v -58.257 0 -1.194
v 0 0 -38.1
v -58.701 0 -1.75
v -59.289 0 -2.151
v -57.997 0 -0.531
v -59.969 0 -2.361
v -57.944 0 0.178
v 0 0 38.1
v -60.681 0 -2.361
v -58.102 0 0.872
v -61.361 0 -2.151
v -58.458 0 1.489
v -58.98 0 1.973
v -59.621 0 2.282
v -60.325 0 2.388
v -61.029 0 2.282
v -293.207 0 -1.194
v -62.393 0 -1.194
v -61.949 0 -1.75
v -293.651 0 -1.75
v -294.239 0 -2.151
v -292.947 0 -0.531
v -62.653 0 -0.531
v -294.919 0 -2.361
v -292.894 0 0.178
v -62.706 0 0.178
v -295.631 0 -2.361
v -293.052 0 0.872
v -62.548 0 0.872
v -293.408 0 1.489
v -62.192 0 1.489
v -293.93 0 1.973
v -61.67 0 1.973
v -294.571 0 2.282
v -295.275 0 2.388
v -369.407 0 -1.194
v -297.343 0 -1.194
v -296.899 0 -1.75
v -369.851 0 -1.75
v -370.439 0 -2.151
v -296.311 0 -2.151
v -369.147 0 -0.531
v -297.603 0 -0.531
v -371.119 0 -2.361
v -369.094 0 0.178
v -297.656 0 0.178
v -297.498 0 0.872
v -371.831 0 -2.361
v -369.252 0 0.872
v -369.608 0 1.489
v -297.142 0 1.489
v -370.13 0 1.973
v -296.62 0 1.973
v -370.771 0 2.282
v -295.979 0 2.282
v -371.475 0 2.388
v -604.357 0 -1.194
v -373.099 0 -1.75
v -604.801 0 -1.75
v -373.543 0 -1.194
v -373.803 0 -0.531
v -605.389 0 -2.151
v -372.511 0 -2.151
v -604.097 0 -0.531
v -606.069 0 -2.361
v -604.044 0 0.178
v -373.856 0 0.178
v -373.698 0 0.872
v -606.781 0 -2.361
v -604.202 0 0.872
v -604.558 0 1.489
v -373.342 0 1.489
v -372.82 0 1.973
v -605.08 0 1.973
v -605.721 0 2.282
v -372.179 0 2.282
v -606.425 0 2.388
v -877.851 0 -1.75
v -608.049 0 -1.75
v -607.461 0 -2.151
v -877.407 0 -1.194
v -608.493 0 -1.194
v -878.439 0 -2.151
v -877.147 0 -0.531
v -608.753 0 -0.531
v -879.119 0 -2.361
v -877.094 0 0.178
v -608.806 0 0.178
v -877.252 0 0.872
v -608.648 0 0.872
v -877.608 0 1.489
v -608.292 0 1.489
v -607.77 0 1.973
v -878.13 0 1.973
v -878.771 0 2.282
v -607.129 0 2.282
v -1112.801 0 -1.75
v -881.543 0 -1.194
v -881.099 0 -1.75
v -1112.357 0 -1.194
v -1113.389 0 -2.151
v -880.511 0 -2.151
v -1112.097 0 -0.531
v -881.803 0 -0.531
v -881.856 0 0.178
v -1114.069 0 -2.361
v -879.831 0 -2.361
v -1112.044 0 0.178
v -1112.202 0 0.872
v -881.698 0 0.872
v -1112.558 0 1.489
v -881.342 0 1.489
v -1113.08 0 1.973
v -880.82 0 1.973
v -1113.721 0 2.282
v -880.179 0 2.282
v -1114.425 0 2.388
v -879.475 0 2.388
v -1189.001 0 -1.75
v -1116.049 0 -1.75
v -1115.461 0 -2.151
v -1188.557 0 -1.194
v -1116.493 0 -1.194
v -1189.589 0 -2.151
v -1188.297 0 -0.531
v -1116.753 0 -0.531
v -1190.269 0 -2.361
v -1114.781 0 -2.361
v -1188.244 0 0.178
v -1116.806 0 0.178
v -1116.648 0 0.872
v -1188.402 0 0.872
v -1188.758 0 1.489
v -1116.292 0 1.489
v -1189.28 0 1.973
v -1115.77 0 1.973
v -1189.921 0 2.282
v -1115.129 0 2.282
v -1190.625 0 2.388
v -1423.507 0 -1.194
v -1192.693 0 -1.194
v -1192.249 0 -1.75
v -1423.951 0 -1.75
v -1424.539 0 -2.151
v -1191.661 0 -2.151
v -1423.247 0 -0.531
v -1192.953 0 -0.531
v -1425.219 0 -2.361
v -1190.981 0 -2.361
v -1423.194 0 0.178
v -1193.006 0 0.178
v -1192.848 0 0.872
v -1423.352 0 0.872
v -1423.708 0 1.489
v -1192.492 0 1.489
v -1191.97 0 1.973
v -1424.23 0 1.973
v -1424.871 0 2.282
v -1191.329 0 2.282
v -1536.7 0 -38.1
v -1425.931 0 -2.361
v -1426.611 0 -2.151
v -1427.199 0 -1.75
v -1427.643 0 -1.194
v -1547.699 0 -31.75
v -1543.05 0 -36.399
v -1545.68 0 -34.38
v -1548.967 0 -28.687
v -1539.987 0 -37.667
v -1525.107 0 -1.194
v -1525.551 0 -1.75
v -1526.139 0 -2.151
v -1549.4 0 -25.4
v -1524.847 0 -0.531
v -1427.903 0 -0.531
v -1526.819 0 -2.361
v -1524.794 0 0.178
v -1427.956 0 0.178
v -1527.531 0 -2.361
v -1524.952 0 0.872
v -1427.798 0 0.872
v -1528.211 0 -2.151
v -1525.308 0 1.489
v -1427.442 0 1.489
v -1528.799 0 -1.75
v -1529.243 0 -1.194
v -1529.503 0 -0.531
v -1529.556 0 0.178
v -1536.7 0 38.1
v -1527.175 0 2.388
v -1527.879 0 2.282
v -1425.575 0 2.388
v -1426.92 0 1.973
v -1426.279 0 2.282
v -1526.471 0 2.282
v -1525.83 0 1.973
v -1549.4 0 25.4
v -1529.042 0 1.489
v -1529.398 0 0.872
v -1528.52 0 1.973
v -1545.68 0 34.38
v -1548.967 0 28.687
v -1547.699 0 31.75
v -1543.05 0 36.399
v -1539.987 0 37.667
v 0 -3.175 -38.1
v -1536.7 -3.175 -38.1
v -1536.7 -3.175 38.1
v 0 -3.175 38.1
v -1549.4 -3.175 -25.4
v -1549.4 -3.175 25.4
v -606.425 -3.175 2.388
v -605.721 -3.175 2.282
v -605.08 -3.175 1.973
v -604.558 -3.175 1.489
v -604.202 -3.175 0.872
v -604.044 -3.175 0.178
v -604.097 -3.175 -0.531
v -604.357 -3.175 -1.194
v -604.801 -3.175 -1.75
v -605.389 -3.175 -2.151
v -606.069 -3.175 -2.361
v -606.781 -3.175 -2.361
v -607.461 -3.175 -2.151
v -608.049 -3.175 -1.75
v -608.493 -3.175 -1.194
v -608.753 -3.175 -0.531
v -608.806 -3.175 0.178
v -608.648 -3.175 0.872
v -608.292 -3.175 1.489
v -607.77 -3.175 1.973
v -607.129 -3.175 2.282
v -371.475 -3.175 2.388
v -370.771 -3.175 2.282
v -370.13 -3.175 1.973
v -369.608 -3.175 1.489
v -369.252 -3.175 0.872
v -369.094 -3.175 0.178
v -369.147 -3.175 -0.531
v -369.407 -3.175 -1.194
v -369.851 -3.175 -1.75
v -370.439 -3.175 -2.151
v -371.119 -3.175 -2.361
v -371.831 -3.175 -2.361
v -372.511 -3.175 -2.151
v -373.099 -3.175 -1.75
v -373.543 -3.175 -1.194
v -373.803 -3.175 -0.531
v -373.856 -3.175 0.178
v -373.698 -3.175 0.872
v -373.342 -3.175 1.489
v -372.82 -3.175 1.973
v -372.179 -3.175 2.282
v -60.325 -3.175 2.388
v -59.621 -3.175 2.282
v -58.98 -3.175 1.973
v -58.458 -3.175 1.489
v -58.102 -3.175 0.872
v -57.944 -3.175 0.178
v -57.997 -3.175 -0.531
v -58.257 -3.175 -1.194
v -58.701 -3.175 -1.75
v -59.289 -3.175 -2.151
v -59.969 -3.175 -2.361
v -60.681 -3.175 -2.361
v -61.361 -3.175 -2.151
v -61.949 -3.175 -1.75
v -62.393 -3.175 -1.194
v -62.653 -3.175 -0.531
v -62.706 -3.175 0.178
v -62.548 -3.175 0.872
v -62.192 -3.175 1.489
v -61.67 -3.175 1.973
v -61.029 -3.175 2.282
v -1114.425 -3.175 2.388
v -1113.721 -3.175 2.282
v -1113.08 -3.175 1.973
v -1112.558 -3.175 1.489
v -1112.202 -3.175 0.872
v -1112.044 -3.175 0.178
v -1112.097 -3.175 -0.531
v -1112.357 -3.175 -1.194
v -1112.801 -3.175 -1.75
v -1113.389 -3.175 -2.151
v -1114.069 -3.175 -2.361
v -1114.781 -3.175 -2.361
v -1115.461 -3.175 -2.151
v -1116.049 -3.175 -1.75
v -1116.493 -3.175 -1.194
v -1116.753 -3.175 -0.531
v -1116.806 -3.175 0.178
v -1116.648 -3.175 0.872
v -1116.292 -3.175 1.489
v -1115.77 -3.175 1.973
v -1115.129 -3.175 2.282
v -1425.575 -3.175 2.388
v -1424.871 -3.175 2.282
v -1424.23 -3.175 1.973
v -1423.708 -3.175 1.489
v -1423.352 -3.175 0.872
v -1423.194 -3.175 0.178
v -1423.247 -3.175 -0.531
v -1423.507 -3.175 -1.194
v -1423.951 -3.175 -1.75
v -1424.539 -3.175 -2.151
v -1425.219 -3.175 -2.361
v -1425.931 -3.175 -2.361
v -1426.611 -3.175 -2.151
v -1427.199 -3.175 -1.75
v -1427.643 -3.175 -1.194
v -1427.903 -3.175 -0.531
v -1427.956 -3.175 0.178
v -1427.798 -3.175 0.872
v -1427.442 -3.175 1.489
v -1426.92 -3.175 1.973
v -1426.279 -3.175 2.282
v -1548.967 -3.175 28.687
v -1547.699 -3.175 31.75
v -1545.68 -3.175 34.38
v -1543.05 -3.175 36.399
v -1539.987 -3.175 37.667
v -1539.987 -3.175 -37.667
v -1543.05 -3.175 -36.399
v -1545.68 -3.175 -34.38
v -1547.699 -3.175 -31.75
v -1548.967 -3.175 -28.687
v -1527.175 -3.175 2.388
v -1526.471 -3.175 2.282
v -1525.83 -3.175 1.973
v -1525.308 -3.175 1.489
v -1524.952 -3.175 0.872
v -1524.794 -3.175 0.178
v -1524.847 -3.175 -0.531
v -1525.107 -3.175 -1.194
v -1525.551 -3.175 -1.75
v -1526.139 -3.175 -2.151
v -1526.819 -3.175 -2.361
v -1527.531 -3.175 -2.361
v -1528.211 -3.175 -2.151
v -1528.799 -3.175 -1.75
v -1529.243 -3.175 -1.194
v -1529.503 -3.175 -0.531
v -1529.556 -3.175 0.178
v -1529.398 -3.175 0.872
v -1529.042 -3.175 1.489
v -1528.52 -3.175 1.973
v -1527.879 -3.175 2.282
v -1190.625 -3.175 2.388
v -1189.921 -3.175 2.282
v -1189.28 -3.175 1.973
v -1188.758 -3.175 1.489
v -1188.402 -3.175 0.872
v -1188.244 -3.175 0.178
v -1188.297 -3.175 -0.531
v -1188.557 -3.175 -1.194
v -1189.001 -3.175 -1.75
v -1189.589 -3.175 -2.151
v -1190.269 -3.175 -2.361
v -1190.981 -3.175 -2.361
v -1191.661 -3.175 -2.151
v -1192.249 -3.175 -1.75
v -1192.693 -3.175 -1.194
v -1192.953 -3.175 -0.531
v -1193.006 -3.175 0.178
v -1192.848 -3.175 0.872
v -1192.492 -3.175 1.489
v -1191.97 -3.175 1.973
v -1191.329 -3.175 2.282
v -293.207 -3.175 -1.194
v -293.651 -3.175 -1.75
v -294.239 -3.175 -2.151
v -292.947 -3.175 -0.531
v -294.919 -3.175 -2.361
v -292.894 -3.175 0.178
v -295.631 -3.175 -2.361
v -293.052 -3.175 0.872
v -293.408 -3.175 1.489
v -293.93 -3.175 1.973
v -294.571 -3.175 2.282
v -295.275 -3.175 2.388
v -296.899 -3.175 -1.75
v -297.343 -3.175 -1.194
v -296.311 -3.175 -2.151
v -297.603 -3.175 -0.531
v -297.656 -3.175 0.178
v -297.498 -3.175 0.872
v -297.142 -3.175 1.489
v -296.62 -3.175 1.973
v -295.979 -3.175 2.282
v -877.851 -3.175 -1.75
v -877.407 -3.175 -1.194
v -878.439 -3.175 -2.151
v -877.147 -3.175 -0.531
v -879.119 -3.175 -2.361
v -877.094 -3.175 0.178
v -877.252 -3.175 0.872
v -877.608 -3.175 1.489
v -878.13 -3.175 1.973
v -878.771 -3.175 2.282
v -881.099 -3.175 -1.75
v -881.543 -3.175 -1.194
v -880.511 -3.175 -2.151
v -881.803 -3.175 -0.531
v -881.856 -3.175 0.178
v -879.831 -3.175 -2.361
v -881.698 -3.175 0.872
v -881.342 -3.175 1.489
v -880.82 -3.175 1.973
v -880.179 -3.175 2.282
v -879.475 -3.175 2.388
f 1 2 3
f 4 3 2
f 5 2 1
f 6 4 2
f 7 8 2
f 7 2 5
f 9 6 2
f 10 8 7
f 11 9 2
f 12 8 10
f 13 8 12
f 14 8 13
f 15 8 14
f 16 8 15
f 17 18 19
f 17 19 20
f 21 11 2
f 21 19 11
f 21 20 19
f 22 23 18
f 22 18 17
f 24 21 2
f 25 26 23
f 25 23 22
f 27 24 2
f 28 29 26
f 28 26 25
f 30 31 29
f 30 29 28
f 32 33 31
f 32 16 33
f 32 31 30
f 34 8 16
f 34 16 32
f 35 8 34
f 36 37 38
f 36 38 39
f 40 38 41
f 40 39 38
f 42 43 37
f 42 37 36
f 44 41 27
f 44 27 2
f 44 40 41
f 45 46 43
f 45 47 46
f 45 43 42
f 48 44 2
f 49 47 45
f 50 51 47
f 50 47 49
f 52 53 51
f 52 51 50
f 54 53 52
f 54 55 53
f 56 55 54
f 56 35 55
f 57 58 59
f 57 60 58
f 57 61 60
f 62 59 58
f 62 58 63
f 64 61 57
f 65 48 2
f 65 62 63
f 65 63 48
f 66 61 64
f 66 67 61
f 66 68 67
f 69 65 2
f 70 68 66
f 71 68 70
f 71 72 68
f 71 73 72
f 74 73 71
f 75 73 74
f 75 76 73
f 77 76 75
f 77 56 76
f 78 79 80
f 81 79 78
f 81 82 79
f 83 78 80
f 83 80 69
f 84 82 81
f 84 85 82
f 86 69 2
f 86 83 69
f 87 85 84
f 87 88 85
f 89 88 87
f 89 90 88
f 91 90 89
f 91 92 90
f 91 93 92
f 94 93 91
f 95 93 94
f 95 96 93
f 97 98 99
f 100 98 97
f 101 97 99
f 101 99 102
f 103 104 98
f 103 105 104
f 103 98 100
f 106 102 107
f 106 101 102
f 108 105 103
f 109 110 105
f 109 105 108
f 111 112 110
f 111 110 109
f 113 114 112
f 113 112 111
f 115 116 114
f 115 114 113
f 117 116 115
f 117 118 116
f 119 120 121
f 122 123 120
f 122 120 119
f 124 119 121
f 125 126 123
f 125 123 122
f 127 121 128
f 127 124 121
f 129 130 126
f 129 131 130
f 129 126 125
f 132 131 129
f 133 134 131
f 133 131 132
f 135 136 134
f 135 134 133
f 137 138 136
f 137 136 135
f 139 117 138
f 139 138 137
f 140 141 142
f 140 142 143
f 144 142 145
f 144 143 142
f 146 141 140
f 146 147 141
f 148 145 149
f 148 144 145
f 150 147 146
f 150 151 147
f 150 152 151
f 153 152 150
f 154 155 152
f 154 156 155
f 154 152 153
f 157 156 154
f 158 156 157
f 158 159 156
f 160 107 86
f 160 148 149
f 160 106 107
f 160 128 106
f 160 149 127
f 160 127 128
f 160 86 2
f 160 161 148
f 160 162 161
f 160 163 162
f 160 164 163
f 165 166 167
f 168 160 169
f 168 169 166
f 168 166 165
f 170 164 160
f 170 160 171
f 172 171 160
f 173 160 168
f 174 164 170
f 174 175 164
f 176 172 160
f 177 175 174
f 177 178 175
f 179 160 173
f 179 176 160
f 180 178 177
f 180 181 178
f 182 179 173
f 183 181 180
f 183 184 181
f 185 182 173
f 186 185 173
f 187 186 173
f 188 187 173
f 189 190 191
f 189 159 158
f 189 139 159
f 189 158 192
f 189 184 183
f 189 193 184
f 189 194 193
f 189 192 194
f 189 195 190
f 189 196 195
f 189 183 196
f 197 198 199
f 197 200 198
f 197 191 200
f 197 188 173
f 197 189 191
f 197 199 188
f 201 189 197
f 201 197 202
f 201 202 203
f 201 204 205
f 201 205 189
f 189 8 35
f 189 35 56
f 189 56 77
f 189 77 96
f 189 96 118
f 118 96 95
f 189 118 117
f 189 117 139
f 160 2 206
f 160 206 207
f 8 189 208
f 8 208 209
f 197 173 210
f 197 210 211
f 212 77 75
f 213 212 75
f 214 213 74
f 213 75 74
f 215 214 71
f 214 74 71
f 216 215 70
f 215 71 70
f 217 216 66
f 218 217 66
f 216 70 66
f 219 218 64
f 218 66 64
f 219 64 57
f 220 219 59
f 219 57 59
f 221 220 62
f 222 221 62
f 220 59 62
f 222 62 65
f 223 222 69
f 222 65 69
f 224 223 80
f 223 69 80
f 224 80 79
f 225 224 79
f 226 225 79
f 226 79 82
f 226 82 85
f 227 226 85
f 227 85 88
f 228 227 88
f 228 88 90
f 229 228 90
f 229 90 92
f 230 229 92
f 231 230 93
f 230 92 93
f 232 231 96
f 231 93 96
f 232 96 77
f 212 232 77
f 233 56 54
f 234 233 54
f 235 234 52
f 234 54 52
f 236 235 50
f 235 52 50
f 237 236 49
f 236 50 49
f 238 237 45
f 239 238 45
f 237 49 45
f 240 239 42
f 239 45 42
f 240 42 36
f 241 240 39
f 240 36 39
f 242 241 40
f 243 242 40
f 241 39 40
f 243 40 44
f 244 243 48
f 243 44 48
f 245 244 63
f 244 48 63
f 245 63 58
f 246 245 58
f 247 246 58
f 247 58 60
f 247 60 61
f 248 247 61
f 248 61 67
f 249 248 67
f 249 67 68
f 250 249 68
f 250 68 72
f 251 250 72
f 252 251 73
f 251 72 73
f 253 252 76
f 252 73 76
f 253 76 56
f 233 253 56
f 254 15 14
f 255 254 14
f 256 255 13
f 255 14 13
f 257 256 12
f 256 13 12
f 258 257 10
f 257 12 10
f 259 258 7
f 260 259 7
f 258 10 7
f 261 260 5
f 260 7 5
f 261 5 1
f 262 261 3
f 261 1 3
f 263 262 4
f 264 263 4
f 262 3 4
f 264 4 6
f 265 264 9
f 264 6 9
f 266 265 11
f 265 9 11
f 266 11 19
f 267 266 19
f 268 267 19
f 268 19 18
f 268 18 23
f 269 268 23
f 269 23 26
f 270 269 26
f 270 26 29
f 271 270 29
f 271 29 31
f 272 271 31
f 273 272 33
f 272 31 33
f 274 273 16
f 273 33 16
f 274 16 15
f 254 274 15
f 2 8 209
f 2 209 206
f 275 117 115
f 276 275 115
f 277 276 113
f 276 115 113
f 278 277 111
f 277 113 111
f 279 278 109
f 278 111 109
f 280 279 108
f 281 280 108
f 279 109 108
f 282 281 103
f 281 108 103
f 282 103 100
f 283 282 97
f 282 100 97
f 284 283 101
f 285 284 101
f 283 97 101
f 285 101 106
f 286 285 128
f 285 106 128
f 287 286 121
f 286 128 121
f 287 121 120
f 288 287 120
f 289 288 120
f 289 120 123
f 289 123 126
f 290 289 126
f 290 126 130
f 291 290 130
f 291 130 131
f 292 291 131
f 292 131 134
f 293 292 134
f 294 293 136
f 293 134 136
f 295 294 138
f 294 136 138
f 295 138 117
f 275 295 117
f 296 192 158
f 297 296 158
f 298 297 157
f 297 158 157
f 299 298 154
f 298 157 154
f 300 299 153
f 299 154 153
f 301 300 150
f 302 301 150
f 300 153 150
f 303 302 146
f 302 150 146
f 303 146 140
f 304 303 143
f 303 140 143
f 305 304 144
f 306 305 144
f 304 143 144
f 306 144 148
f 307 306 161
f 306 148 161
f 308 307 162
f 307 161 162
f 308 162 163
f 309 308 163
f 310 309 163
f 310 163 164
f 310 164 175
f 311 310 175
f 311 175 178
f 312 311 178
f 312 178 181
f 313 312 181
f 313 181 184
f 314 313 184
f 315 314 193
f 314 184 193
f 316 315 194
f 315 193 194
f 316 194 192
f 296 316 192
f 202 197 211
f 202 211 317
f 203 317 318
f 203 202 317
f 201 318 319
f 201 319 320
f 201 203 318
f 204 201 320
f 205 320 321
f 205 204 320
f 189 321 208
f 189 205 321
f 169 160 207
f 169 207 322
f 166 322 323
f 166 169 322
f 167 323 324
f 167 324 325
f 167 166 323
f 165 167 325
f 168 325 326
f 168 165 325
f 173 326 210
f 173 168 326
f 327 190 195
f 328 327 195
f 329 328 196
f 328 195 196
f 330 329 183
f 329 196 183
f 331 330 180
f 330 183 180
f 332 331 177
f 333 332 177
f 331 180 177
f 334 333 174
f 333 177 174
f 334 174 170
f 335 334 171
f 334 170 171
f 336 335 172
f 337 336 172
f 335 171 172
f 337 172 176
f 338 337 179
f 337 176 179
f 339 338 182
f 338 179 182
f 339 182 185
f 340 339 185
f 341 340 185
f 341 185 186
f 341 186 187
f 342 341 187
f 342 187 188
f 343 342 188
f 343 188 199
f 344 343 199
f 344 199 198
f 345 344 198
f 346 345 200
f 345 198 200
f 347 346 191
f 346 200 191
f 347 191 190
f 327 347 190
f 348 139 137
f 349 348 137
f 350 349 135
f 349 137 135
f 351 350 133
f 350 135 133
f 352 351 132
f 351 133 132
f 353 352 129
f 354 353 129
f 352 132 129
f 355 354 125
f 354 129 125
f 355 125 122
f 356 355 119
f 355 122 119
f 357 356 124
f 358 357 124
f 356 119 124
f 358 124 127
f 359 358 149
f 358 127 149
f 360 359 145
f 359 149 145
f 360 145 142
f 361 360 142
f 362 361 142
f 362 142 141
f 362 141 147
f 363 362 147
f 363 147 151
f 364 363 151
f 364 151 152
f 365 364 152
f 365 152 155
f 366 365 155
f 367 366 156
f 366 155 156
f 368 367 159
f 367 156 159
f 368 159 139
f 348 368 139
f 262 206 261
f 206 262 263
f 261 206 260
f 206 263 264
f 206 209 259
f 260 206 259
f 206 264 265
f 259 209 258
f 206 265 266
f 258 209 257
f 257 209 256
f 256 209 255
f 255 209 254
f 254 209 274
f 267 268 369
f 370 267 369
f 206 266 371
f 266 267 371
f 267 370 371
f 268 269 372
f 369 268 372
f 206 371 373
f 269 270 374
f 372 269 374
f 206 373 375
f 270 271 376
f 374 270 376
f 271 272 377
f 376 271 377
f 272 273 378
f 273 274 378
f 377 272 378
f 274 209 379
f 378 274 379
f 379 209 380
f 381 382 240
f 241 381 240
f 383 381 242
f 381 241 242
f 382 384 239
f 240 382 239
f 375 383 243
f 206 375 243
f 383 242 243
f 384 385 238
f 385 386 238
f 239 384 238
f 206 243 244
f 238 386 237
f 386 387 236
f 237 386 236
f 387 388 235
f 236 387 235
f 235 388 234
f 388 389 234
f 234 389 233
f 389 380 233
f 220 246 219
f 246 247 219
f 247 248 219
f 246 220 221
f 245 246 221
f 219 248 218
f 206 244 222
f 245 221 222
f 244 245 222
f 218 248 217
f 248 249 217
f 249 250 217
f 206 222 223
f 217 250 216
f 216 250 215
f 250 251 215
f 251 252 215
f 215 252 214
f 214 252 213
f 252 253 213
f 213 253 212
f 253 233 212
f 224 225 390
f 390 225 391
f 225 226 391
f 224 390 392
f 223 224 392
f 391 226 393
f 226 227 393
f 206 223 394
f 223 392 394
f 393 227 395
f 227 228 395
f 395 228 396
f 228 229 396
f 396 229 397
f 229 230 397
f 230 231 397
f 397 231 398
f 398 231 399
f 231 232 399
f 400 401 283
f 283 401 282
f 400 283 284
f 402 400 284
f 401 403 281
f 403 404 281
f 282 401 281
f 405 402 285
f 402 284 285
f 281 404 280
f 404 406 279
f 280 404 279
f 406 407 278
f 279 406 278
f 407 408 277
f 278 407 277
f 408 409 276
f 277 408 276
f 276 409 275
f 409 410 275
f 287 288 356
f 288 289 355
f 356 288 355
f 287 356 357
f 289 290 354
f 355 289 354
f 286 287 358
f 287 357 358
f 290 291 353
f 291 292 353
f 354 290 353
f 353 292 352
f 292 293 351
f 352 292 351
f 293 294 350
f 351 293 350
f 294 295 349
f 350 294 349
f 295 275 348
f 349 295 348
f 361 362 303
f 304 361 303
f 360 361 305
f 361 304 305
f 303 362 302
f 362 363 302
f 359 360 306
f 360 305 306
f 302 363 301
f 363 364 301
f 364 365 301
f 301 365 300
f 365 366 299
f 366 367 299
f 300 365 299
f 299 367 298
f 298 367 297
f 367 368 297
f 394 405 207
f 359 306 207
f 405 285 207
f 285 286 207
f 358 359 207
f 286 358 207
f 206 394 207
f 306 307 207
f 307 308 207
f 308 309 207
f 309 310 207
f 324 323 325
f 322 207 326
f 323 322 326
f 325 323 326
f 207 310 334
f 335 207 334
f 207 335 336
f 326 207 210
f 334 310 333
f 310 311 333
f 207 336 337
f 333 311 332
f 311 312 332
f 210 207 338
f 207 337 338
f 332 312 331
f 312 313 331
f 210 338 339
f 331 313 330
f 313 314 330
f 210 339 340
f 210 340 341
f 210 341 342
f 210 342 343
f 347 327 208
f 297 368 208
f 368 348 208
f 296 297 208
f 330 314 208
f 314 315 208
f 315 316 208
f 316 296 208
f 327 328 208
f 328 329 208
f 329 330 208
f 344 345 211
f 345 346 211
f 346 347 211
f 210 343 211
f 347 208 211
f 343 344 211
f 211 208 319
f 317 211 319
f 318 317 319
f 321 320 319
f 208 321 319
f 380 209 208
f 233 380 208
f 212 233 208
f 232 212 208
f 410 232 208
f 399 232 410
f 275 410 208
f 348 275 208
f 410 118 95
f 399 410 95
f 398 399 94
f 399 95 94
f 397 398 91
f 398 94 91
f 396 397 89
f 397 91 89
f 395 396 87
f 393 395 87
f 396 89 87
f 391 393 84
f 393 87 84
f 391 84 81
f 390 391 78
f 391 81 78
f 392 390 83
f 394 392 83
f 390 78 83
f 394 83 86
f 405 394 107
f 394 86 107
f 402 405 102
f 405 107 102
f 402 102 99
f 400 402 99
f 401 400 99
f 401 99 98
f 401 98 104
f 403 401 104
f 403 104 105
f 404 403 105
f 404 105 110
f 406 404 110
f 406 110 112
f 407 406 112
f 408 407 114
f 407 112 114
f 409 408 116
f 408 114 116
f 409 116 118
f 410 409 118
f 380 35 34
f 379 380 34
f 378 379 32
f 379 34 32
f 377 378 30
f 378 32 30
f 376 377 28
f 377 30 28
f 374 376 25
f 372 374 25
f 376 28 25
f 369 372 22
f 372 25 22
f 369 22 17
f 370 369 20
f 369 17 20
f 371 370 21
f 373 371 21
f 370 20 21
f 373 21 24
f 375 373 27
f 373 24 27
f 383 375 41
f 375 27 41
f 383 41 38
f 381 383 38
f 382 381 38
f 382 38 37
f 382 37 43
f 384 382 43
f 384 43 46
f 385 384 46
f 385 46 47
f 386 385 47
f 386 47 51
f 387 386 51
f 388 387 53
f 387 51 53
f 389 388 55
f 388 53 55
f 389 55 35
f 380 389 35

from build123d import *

# Parameters (mm, degrees)
SKETCH1_R      = 2.3876
EXTRUDE1_DEPTH = 3.175


with BuildPart() as part:
    # Sketch1 → Extrude1 (new body)
    with BuildSketch(Plane(origin=(0, 0, 0), x_dir=(-1, 0, 0), z_dir=(0, 1, 0))):
        with BuildLine():
            Line((0, 38.1), (0, -38.1))
            Line((0, -38.1), (1536.7, -38.1))
            ThreePointArc((1536.7, -38.1), (1545.680256121, -34.380256121), (1549.4, -25.4))
            Line((1549.4, -25.4), (1549.4, 25.4))
            ThreePointArc((1549.4, 25.4), (1545.680256121, 34.380256121), (1536.7, 38.1))
            Line((1536.7, 38.1), (0, 38.1))
        make_face()
        with Locations(Location((60.325, 0, 0), (0, 0, 90))):
            Circle(SKETCH1_R, mode=Mode.SUBTRACT)
        with Locations(Location((295.275, 0, 0), (0, 0, 90))):
            Circle(SKETCH1_R, mode=Mode.SUBTRACT)
        with Locations(Location((371.475, 0, 0), (0, 0, 90))):
            Circle(SKETCH1_R, mode=Mode.SUBTRACT)
        with Locations(Location((606.425, 0, 0), (0, 0, 90))):
            Circle(SKETCH1_R, mode=Mode.SUBTRACT)
        with Locations(Location((879.475, 0, 0), (0, 0, 90))):
            Circle(SKETCH1_R, mode=Mode.SUBTRACT)
        with Locations(Location((1114.425, 0, 0), (0, 0, 90))):
            Circle(SKETCH1_R, mode=Mode.SUBTRACT)
        with Locations(Location((1190.625, 0, 0), (0, 0, 90))):
            Circle(SKETCH1_R, mode=Mode.SUBTRACT)
        with Locations(Location((1425.575, 0, 0), (0, 0, 90))):
            Circle(SKETCH1_R, mode=Mode.SUBTRACT)
        with Locations(Location((1527.175, 0, 0), (0, 0, 90))):
            Circle(SKETCH1_R, mode=Mode.SUBTRACT)
    extrude(amount=-EXTRUDE1_DEPTH)


solid = part.part
